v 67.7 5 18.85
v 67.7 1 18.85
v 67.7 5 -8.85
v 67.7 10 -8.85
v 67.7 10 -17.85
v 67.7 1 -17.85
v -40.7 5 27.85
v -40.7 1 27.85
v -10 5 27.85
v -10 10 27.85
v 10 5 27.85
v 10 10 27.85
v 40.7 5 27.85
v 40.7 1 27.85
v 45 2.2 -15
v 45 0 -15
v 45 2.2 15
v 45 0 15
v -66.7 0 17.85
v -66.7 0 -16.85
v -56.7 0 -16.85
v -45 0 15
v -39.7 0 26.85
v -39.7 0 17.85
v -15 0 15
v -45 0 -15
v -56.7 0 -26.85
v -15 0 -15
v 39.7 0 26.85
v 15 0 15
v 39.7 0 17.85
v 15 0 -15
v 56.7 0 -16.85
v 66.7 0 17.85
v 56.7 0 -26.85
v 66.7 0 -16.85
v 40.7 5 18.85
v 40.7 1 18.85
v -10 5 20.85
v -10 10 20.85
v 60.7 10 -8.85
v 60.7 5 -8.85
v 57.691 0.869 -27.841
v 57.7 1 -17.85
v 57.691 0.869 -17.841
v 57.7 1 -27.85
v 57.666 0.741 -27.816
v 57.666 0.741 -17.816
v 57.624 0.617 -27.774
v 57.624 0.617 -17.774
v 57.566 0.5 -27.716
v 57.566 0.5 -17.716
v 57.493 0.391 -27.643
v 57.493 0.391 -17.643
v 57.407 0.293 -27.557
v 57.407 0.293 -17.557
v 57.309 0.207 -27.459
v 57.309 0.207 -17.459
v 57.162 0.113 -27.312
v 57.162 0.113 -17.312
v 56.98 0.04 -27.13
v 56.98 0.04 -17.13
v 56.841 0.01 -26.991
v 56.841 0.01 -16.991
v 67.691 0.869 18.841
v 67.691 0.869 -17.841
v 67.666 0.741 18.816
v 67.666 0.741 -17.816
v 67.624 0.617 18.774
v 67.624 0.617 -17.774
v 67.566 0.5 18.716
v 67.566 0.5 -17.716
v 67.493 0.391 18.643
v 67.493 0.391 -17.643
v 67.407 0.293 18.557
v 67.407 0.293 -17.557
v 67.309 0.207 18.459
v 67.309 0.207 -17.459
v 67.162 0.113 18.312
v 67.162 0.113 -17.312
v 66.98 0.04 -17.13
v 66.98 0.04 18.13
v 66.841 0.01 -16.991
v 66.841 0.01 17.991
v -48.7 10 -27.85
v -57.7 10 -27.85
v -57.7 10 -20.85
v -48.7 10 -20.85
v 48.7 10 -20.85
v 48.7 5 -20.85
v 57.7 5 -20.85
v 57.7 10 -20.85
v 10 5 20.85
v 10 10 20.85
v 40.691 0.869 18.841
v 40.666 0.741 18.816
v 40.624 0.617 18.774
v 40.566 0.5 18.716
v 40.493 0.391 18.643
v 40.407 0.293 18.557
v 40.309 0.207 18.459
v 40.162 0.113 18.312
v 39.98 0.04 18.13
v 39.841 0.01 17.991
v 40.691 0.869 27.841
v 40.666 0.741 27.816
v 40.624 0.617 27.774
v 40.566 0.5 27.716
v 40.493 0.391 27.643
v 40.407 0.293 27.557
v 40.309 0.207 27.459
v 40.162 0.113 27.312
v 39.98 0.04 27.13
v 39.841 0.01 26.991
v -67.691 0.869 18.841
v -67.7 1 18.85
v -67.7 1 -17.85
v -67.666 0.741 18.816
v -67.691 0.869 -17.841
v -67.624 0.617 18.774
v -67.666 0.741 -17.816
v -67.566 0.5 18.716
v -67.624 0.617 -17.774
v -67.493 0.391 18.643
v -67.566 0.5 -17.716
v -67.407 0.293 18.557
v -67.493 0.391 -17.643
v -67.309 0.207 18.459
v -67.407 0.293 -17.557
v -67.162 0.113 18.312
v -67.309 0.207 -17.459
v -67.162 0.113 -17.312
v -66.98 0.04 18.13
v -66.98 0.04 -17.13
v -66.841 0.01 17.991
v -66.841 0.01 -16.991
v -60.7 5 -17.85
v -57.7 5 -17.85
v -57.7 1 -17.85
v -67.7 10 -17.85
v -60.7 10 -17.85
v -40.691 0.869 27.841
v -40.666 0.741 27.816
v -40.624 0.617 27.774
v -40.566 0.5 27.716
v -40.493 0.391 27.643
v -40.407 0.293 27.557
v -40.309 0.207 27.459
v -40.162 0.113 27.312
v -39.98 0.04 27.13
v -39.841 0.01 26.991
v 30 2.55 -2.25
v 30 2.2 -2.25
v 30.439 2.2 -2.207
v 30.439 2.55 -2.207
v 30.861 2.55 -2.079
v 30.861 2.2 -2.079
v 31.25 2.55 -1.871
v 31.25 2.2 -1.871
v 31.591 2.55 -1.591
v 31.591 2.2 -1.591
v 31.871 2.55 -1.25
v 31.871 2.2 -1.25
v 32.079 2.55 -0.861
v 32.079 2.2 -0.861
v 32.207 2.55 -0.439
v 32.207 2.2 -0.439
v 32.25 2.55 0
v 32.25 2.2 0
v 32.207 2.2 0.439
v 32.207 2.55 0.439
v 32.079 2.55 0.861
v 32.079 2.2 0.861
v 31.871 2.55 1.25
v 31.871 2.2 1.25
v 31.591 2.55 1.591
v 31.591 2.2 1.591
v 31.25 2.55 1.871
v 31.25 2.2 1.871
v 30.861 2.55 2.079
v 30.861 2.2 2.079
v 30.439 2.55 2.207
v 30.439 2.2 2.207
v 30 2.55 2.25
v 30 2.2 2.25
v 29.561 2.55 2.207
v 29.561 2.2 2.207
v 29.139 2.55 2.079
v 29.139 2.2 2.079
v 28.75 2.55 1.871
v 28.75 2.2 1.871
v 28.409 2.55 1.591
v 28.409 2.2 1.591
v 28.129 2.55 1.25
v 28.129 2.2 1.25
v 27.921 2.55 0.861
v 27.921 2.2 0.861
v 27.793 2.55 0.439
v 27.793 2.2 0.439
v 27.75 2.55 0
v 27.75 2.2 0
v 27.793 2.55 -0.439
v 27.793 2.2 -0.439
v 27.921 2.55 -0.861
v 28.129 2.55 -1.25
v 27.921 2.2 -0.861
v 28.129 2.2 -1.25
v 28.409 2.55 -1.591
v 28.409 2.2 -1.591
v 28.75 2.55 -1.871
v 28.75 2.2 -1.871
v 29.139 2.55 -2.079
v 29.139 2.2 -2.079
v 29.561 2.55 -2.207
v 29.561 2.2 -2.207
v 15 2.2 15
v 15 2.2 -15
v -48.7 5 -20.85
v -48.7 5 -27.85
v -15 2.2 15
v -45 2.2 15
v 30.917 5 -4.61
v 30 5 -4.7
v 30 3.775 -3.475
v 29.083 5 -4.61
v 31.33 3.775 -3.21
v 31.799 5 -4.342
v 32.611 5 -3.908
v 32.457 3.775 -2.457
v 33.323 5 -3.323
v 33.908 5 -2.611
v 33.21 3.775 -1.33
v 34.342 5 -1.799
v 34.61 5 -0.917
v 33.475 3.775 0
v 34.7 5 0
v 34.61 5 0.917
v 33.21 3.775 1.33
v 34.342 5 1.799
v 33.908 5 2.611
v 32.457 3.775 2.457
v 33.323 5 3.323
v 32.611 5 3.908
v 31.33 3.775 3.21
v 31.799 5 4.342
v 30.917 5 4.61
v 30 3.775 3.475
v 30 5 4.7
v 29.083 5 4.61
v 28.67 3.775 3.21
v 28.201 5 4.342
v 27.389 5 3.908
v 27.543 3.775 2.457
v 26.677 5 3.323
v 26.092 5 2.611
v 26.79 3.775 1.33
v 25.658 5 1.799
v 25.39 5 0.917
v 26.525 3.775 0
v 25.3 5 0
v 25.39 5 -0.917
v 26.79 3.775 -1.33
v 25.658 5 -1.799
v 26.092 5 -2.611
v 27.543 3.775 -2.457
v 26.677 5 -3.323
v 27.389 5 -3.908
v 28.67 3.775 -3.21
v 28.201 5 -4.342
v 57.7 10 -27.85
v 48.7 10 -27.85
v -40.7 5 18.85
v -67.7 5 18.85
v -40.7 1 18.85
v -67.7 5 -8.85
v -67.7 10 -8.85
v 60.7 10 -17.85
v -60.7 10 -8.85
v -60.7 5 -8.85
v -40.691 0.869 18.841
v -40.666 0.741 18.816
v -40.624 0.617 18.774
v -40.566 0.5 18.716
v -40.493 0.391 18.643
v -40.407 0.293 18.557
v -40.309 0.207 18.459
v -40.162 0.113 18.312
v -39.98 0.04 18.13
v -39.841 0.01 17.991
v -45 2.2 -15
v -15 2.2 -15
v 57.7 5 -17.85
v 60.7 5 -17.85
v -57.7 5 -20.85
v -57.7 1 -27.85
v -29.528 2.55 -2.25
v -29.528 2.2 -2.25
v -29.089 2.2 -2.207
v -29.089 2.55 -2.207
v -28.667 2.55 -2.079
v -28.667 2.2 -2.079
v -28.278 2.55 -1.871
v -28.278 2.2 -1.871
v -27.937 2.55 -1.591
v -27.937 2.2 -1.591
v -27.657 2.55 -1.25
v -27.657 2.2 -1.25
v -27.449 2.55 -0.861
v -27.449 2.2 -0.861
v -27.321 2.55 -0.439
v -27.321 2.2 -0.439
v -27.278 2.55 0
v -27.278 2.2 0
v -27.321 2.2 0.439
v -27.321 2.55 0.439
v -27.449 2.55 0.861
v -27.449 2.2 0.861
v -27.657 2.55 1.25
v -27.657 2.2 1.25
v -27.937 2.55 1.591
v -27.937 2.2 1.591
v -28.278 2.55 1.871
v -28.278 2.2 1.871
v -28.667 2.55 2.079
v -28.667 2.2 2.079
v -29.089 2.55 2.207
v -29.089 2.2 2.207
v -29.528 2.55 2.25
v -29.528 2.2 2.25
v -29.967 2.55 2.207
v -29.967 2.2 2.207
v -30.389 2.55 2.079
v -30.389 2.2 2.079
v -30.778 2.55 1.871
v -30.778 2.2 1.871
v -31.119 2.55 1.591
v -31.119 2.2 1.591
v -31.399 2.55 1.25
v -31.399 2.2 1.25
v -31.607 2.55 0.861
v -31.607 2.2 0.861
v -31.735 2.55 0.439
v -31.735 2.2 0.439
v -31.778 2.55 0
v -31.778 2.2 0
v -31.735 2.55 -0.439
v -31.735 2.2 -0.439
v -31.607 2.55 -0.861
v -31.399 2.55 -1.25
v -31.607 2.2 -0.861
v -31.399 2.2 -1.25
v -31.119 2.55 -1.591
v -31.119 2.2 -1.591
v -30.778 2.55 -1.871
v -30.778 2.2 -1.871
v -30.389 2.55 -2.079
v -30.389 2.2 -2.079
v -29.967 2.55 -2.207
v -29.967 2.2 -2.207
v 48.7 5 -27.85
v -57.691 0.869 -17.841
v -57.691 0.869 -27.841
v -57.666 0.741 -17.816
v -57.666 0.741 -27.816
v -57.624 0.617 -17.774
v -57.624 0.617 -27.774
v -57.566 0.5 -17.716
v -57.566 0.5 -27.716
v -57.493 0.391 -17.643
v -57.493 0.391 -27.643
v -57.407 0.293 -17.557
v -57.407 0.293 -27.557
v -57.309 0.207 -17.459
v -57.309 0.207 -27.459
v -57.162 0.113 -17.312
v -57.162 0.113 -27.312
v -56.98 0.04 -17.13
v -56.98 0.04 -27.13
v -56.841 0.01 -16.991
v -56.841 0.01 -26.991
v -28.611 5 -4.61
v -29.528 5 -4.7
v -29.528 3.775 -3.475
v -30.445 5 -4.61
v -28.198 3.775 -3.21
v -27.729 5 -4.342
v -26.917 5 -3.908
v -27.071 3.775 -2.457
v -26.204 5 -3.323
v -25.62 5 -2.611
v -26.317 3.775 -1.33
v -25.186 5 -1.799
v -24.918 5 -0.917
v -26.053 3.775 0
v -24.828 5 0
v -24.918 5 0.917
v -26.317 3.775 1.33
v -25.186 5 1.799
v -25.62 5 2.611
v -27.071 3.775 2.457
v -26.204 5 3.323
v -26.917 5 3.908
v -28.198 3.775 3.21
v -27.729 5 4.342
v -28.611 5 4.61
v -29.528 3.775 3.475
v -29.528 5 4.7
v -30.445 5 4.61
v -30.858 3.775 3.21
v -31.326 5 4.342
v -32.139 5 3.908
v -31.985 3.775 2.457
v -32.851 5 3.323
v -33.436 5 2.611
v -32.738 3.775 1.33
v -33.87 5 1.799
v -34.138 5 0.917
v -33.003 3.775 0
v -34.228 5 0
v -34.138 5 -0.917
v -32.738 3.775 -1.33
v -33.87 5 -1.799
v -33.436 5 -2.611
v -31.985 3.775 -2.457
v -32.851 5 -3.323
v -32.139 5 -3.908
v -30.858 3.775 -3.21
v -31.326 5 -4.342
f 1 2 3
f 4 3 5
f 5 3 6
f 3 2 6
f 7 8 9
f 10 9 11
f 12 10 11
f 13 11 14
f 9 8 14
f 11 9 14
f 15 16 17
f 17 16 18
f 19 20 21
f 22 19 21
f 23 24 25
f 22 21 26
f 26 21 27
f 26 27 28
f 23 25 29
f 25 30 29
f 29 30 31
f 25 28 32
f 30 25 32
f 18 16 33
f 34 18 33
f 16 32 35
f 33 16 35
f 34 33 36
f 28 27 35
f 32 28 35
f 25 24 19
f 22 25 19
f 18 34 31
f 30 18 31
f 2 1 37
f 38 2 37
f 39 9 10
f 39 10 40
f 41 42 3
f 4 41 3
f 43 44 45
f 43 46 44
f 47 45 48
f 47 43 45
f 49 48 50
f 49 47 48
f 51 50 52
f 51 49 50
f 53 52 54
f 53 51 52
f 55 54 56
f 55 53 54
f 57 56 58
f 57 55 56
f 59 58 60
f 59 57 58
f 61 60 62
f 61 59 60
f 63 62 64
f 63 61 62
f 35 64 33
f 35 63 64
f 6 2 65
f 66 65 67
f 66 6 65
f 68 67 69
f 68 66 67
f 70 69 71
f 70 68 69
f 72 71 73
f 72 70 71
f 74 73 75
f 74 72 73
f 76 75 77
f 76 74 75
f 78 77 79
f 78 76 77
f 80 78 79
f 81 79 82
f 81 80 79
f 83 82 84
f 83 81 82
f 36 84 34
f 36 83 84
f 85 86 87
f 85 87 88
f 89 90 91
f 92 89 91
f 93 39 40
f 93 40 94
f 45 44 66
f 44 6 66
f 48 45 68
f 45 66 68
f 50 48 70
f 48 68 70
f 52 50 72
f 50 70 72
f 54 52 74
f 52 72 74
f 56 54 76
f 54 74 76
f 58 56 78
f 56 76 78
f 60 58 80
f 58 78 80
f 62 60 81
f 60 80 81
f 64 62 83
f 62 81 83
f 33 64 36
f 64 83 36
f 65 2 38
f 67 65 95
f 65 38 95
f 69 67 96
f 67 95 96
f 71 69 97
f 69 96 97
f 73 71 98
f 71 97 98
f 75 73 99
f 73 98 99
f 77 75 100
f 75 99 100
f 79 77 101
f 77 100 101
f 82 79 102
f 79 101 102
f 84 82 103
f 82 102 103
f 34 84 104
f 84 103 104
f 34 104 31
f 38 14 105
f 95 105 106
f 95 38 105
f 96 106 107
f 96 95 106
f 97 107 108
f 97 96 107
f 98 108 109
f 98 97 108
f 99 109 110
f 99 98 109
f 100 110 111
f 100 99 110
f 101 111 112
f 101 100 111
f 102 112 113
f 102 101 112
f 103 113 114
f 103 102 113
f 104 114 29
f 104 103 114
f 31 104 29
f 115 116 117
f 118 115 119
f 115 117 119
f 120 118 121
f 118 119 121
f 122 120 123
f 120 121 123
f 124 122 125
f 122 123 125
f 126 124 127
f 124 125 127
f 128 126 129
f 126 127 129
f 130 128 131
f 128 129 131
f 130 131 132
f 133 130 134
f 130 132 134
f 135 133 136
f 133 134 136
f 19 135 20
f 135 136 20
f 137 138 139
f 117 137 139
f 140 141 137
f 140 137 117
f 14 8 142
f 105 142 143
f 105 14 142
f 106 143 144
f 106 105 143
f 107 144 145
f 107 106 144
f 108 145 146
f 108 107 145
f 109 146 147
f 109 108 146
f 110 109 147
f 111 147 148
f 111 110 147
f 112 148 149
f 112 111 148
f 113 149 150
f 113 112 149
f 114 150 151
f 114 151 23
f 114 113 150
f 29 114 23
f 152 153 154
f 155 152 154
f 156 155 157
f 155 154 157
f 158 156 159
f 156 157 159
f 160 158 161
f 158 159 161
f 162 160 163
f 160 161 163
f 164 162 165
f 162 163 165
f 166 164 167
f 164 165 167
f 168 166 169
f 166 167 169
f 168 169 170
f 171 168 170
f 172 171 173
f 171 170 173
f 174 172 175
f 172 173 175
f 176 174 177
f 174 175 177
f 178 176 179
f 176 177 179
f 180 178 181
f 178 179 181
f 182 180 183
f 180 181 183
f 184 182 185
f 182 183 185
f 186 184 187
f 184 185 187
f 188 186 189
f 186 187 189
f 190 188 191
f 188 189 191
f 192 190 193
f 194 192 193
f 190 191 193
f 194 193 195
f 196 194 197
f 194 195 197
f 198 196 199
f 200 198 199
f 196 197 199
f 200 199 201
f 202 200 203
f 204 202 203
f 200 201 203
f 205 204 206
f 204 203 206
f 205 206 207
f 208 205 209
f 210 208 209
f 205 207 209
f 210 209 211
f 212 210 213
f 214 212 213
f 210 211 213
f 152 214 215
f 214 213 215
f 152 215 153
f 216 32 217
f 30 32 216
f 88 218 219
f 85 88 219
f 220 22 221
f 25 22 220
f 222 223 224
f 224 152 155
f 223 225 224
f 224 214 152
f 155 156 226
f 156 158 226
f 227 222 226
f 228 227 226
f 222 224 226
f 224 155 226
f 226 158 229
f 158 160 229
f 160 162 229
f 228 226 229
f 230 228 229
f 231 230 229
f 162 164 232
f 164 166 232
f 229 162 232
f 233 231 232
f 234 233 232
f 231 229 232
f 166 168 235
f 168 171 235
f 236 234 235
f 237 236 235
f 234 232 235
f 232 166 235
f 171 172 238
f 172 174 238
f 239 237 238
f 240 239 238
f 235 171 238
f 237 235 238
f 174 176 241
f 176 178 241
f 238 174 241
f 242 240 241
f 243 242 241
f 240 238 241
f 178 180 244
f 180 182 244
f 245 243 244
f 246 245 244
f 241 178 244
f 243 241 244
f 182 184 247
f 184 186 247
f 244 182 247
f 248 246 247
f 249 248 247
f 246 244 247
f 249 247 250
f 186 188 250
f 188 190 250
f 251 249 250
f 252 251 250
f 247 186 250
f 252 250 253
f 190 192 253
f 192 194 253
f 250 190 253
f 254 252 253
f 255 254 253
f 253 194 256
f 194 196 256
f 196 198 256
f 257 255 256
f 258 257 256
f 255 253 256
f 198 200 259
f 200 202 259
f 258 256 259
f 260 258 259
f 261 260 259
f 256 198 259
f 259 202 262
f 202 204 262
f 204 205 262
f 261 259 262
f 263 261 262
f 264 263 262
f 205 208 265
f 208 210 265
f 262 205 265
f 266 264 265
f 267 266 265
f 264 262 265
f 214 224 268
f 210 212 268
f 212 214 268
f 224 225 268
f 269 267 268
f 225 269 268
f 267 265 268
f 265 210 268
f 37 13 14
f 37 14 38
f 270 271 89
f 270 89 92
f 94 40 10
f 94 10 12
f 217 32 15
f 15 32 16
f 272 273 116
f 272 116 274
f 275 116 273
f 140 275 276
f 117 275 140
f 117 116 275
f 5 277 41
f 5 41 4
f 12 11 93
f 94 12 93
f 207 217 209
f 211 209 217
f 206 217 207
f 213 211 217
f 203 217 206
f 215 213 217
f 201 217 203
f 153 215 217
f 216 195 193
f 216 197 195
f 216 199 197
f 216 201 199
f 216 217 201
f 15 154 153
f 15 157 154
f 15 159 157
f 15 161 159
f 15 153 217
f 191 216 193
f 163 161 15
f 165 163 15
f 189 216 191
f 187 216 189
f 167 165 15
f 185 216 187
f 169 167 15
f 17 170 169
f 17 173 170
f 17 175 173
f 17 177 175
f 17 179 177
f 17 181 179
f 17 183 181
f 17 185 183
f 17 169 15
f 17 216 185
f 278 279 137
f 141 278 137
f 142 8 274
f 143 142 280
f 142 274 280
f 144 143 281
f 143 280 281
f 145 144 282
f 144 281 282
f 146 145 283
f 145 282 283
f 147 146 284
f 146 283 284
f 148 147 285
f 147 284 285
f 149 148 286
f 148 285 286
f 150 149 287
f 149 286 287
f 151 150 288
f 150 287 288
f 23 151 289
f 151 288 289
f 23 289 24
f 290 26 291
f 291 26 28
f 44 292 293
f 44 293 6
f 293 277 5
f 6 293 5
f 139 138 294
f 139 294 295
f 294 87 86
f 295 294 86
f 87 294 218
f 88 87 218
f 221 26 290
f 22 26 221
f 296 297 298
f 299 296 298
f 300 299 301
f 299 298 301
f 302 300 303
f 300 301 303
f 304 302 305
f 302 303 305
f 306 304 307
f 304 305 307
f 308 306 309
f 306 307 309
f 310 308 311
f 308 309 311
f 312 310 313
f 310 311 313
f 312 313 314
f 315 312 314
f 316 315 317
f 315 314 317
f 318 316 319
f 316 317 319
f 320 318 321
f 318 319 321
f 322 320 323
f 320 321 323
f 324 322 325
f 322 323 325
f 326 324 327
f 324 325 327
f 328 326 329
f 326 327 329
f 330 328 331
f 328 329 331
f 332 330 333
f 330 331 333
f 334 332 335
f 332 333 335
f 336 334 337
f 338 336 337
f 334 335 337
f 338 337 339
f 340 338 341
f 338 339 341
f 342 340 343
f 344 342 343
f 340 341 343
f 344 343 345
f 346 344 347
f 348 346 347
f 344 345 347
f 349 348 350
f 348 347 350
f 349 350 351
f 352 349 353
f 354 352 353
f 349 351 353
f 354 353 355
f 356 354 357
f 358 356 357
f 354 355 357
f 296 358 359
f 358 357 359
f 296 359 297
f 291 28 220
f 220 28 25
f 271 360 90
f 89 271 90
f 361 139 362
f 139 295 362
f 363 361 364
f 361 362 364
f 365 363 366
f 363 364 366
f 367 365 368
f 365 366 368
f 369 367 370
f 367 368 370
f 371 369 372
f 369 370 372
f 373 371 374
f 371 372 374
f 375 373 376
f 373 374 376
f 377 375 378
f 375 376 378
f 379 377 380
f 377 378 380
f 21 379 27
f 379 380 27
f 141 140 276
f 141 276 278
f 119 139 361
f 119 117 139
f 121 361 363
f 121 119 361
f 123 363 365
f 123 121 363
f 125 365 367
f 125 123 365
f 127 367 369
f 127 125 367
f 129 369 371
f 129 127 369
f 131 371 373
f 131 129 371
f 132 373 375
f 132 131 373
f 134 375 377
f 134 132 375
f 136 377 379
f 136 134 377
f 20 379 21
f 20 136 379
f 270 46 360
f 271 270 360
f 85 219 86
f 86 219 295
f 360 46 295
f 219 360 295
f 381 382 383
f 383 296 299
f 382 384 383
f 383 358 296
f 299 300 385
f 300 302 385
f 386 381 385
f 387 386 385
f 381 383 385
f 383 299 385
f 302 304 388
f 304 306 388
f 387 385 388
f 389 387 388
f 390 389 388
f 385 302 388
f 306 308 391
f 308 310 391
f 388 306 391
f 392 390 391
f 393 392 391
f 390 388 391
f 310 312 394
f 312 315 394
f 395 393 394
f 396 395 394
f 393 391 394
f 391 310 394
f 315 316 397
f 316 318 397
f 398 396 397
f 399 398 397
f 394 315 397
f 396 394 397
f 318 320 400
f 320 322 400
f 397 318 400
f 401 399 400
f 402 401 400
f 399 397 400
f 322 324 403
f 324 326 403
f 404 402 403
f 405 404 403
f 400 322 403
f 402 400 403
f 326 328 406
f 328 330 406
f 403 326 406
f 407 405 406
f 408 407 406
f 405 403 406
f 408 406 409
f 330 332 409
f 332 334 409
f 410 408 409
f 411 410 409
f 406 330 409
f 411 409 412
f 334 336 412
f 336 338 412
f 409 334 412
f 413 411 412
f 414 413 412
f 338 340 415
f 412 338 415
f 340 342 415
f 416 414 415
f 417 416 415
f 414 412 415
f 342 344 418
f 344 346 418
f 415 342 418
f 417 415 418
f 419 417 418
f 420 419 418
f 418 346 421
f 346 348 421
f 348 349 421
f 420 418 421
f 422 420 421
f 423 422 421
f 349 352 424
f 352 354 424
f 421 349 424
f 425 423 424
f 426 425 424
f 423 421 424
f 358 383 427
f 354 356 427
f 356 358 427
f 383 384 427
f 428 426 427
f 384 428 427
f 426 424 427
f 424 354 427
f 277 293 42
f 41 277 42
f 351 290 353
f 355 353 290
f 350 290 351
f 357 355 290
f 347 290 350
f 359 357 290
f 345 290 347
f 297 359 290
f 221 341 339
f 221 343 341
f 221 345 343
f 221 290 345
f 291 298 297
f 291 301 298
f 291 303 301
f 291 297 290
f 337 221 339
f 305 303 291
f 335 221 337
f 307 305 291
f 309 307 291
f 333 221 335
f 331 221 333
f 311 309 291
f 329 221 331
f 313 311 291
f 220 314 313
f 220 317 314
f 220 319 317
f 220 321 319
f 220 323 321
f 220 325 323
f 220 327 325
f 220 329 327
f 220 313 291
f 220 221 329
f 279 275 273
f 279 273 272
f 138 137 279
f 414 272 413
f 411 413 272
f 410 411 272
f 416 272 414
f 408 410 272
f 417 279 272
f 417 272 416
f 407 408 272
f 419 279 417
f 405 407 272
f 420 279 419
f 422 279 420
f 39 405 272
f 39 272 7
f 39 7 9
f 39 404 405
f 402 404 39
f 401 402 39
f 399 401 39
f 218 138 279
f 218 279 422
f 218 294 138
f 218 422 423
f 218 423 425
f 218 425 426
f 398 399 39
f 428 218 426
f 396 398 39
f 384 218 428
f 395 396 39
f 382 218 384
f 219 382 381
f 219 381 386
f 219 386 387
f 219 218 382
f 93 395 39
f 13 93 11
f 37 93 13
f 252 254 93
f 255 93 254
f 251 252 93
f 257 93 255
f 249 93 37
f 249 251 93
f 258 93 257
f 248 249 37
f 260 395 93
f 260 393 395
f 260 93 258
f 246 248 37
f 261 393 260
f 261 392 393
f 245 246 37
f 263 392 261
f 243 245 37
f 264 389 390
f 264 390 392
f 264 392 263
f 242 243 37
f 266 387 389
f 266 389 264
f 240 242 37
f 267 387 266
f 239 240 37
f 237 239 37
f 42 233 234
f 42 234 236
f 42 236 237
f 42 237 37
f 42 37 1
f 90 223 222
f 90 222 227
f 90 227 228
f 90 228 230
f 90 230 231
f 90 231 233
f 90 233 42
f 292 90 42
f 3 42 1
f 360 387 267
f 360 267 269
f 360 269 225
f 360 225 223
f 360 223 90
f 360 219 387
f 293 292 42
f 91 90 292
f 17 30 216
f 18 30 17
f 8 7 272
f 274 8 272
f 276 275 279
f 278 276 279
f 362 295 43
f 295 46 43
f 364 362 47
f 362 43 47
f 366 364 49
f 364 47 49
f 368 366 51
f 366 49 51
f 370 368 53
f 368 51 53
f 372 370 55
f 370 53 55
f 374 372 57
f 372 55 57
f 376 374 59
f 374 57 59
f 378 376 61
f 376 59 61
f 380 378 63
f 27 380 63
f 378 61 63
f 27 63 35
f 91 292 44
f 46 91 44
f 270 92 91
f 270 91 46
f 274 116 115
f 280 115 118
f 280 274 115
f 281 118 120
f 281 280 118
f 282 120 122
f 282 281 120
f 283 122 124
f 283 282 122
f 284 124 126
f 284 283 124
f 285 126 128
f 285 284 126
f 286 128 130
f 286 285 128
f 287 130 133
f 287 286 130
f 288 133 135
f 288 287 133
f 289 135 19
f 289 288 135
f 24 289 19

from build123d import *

# Parameters (mm, degrees)
SKETCH1_W                                     = 135.4
SKETCH1_H                                     = 55.7
BOSS_EXTRUDE1_DEPTH                           = 5
SKETCH2_W                                     = 20
SKETCH2_H                                     = 7
BOSS_EXTRUDE2_DEPTH                           = 5
SKETCH3_W                                     = 27
SKETCH3_H                                     = 9
CUT_EXTRUDE1_DEPTH                            = 74.375149063
CSK_FOR_M4_COUNTERSUNK_FLAT_HEAD1_D           = 4.5
CSK_FOR_M4_COUNTERSUNK_FLAT_HEAD1_CSINK_D     = 9.4
CSK_FOR_M4_COUNTERSUNK_FLAT_HEAD1_CSINK_ANGLE = 90
SKETCH7_W                                     = 30
SKETCH7_H                                     = 30
CUT_EXTRUDE2_DEPTH                            = 2.2
SKETCH9_W                                     = 10
SKETCH9_H                                     = 10
CUT_EXTRUDE5_DEPTH                            = 74.88445371
FILLET1_R                                     = 1


with BuildPart() as part:
    # Sketch1 → Boss-Extrude1 (new body)
    with BuildSketch(Plane(origin=(0, 0, 0), x_dir=(1, 0, 0), z_dir=(0, 1, 0))):
        Rectangle(SKETCH1_W, SKETCH1_H)
    extrude(amount=BOSS_EXTRUDE1_DEPTH)

    # Sketch2 → Boss-Extrude2 (add)
    with BuildSketch(Plane(origin=(0, 5, 0), x_dir=(1, 0, 0), z_dir=(0, 1, 0))):
        Polygon((-60.7, 20.85), (-48.7, 20.85), (-48.7, 27.85), (-67.7, 27.85), (-67.7, 8.85), (-60.7, 8.85), align=None)
        with Locations((0, -24.35)):
            Rectangle(SKETCH2_W, SKETCH2_H)
        Polygon((67.7, 27.85), (48.7, 27.85), (48.7, 20.85), (60.7, 20.85), (60.7, 8.85), (67.7, 8.85), align=None)
    extrude(amount=BOSS_EXTRUDE2_DEPTH)

    # Sketch3 → Cut-Extrude1 (cut, through all)
    with BuildSketch(Plane(origin=(0, 5, 0), x_dir=(1, 0, 0), z_dir=(0, 1, 0))):
        with Locations((-54.2, -23.35)):
            Rectangle(SKETCH3_W, SKETCH3_H)
    cut_extrude1 = extrude(amount=-CUT_EXTRUDE1_DEPTH, mode=Mode.SUBTRACT)

    # Mirror1: Cut-Extrude1 across plane
    add(cut_extrude1.mirror(Plane(origin=(0, 0, 0), x_dir=(0, 0, 1), z_dir=(1, 0, 0))), mode=Mode.SUBTRACT)

    # CSK for M4 Countersunk Flat Head1 (through all)
    with Locations(Plane(origin=(-29.527844293, 5, 0), x_dir=(0, 0, 1), z_dir=(0, 1, 0))):
        with Locations((0, 0), (0, 59.527844293)):
            CounterSinkHole(CSK_FOR_M4_COUNTERSUNK_FLAT_HEAD1_D / 2, CSK_FOR_M4_COUNTERSUNK_FLAT_HEAD1_CSINK_D / 2, counter_sink_angle=CSK_FOR_M4_COUNTERSUNK_FLAT_HEAD1_CSINK_ANGLE)

    # Sketch7 → Cut-Extrude2 (cut)
    with BuildSketch(Plane.XZ):
        with Locations((-30, 0)):
            Rectangle(SKETCH7_W, SKETCH7_H)
        with Locations((30, 0)):
            Rectangle(SKETCH7_W, SKETCH7_H)
    extrude(amount=-CUT_EXTRUDE2_DEPTH, mode=Mode.SUBTRACT)

    # Sketch9 → Cut-Extrude5 (cut, through all)
    with BuildSketch(Plane(origin=(0, 10, 0), x_dir=(1, 0, 0), z_dir=(0, 1, 0))):
        with Locations((62.7, 22.85)):
            Rectangle(SKETCH9_W, SKETCH9_H)
    cut_extrude5 = extrude(amount=-CUT_EXTRUDE5_DEPTH, mode=Mode.SUBTRACT)

    # Mirror2: Cut-Extrude5 across plane
    add(cut_extrude5.mirror(Plane(origin=(0, 0, 0), x_dir=(0, 0, 1), z_dir=(1, 0, 0))), mode=Mode.SUBTRACT)

    # Fillet1
    fillet1_edges = [part.edges().sort_by_distance(p)[0] for p in [
        (0, 0, -27.85),
        (62.7, 0, -17.85),
        (57.7, 0, -22.85),
        (-67.7, 0, 0.5),
        (-57.7, 0, -22.85),
        (-62.7, 0, -17.85),
        (0, 0, 27.85),
        (-54.2, 0, 18.85),
        (-40.7, 0, 23.35),
        (67.7, 0, 0.5),
        (40.7, 0, 23.35),
        (54.2, 0, 18.85),
    ]]
    fillet(fillet1_edges, radius=FILLET1_R)


solid = part.part
